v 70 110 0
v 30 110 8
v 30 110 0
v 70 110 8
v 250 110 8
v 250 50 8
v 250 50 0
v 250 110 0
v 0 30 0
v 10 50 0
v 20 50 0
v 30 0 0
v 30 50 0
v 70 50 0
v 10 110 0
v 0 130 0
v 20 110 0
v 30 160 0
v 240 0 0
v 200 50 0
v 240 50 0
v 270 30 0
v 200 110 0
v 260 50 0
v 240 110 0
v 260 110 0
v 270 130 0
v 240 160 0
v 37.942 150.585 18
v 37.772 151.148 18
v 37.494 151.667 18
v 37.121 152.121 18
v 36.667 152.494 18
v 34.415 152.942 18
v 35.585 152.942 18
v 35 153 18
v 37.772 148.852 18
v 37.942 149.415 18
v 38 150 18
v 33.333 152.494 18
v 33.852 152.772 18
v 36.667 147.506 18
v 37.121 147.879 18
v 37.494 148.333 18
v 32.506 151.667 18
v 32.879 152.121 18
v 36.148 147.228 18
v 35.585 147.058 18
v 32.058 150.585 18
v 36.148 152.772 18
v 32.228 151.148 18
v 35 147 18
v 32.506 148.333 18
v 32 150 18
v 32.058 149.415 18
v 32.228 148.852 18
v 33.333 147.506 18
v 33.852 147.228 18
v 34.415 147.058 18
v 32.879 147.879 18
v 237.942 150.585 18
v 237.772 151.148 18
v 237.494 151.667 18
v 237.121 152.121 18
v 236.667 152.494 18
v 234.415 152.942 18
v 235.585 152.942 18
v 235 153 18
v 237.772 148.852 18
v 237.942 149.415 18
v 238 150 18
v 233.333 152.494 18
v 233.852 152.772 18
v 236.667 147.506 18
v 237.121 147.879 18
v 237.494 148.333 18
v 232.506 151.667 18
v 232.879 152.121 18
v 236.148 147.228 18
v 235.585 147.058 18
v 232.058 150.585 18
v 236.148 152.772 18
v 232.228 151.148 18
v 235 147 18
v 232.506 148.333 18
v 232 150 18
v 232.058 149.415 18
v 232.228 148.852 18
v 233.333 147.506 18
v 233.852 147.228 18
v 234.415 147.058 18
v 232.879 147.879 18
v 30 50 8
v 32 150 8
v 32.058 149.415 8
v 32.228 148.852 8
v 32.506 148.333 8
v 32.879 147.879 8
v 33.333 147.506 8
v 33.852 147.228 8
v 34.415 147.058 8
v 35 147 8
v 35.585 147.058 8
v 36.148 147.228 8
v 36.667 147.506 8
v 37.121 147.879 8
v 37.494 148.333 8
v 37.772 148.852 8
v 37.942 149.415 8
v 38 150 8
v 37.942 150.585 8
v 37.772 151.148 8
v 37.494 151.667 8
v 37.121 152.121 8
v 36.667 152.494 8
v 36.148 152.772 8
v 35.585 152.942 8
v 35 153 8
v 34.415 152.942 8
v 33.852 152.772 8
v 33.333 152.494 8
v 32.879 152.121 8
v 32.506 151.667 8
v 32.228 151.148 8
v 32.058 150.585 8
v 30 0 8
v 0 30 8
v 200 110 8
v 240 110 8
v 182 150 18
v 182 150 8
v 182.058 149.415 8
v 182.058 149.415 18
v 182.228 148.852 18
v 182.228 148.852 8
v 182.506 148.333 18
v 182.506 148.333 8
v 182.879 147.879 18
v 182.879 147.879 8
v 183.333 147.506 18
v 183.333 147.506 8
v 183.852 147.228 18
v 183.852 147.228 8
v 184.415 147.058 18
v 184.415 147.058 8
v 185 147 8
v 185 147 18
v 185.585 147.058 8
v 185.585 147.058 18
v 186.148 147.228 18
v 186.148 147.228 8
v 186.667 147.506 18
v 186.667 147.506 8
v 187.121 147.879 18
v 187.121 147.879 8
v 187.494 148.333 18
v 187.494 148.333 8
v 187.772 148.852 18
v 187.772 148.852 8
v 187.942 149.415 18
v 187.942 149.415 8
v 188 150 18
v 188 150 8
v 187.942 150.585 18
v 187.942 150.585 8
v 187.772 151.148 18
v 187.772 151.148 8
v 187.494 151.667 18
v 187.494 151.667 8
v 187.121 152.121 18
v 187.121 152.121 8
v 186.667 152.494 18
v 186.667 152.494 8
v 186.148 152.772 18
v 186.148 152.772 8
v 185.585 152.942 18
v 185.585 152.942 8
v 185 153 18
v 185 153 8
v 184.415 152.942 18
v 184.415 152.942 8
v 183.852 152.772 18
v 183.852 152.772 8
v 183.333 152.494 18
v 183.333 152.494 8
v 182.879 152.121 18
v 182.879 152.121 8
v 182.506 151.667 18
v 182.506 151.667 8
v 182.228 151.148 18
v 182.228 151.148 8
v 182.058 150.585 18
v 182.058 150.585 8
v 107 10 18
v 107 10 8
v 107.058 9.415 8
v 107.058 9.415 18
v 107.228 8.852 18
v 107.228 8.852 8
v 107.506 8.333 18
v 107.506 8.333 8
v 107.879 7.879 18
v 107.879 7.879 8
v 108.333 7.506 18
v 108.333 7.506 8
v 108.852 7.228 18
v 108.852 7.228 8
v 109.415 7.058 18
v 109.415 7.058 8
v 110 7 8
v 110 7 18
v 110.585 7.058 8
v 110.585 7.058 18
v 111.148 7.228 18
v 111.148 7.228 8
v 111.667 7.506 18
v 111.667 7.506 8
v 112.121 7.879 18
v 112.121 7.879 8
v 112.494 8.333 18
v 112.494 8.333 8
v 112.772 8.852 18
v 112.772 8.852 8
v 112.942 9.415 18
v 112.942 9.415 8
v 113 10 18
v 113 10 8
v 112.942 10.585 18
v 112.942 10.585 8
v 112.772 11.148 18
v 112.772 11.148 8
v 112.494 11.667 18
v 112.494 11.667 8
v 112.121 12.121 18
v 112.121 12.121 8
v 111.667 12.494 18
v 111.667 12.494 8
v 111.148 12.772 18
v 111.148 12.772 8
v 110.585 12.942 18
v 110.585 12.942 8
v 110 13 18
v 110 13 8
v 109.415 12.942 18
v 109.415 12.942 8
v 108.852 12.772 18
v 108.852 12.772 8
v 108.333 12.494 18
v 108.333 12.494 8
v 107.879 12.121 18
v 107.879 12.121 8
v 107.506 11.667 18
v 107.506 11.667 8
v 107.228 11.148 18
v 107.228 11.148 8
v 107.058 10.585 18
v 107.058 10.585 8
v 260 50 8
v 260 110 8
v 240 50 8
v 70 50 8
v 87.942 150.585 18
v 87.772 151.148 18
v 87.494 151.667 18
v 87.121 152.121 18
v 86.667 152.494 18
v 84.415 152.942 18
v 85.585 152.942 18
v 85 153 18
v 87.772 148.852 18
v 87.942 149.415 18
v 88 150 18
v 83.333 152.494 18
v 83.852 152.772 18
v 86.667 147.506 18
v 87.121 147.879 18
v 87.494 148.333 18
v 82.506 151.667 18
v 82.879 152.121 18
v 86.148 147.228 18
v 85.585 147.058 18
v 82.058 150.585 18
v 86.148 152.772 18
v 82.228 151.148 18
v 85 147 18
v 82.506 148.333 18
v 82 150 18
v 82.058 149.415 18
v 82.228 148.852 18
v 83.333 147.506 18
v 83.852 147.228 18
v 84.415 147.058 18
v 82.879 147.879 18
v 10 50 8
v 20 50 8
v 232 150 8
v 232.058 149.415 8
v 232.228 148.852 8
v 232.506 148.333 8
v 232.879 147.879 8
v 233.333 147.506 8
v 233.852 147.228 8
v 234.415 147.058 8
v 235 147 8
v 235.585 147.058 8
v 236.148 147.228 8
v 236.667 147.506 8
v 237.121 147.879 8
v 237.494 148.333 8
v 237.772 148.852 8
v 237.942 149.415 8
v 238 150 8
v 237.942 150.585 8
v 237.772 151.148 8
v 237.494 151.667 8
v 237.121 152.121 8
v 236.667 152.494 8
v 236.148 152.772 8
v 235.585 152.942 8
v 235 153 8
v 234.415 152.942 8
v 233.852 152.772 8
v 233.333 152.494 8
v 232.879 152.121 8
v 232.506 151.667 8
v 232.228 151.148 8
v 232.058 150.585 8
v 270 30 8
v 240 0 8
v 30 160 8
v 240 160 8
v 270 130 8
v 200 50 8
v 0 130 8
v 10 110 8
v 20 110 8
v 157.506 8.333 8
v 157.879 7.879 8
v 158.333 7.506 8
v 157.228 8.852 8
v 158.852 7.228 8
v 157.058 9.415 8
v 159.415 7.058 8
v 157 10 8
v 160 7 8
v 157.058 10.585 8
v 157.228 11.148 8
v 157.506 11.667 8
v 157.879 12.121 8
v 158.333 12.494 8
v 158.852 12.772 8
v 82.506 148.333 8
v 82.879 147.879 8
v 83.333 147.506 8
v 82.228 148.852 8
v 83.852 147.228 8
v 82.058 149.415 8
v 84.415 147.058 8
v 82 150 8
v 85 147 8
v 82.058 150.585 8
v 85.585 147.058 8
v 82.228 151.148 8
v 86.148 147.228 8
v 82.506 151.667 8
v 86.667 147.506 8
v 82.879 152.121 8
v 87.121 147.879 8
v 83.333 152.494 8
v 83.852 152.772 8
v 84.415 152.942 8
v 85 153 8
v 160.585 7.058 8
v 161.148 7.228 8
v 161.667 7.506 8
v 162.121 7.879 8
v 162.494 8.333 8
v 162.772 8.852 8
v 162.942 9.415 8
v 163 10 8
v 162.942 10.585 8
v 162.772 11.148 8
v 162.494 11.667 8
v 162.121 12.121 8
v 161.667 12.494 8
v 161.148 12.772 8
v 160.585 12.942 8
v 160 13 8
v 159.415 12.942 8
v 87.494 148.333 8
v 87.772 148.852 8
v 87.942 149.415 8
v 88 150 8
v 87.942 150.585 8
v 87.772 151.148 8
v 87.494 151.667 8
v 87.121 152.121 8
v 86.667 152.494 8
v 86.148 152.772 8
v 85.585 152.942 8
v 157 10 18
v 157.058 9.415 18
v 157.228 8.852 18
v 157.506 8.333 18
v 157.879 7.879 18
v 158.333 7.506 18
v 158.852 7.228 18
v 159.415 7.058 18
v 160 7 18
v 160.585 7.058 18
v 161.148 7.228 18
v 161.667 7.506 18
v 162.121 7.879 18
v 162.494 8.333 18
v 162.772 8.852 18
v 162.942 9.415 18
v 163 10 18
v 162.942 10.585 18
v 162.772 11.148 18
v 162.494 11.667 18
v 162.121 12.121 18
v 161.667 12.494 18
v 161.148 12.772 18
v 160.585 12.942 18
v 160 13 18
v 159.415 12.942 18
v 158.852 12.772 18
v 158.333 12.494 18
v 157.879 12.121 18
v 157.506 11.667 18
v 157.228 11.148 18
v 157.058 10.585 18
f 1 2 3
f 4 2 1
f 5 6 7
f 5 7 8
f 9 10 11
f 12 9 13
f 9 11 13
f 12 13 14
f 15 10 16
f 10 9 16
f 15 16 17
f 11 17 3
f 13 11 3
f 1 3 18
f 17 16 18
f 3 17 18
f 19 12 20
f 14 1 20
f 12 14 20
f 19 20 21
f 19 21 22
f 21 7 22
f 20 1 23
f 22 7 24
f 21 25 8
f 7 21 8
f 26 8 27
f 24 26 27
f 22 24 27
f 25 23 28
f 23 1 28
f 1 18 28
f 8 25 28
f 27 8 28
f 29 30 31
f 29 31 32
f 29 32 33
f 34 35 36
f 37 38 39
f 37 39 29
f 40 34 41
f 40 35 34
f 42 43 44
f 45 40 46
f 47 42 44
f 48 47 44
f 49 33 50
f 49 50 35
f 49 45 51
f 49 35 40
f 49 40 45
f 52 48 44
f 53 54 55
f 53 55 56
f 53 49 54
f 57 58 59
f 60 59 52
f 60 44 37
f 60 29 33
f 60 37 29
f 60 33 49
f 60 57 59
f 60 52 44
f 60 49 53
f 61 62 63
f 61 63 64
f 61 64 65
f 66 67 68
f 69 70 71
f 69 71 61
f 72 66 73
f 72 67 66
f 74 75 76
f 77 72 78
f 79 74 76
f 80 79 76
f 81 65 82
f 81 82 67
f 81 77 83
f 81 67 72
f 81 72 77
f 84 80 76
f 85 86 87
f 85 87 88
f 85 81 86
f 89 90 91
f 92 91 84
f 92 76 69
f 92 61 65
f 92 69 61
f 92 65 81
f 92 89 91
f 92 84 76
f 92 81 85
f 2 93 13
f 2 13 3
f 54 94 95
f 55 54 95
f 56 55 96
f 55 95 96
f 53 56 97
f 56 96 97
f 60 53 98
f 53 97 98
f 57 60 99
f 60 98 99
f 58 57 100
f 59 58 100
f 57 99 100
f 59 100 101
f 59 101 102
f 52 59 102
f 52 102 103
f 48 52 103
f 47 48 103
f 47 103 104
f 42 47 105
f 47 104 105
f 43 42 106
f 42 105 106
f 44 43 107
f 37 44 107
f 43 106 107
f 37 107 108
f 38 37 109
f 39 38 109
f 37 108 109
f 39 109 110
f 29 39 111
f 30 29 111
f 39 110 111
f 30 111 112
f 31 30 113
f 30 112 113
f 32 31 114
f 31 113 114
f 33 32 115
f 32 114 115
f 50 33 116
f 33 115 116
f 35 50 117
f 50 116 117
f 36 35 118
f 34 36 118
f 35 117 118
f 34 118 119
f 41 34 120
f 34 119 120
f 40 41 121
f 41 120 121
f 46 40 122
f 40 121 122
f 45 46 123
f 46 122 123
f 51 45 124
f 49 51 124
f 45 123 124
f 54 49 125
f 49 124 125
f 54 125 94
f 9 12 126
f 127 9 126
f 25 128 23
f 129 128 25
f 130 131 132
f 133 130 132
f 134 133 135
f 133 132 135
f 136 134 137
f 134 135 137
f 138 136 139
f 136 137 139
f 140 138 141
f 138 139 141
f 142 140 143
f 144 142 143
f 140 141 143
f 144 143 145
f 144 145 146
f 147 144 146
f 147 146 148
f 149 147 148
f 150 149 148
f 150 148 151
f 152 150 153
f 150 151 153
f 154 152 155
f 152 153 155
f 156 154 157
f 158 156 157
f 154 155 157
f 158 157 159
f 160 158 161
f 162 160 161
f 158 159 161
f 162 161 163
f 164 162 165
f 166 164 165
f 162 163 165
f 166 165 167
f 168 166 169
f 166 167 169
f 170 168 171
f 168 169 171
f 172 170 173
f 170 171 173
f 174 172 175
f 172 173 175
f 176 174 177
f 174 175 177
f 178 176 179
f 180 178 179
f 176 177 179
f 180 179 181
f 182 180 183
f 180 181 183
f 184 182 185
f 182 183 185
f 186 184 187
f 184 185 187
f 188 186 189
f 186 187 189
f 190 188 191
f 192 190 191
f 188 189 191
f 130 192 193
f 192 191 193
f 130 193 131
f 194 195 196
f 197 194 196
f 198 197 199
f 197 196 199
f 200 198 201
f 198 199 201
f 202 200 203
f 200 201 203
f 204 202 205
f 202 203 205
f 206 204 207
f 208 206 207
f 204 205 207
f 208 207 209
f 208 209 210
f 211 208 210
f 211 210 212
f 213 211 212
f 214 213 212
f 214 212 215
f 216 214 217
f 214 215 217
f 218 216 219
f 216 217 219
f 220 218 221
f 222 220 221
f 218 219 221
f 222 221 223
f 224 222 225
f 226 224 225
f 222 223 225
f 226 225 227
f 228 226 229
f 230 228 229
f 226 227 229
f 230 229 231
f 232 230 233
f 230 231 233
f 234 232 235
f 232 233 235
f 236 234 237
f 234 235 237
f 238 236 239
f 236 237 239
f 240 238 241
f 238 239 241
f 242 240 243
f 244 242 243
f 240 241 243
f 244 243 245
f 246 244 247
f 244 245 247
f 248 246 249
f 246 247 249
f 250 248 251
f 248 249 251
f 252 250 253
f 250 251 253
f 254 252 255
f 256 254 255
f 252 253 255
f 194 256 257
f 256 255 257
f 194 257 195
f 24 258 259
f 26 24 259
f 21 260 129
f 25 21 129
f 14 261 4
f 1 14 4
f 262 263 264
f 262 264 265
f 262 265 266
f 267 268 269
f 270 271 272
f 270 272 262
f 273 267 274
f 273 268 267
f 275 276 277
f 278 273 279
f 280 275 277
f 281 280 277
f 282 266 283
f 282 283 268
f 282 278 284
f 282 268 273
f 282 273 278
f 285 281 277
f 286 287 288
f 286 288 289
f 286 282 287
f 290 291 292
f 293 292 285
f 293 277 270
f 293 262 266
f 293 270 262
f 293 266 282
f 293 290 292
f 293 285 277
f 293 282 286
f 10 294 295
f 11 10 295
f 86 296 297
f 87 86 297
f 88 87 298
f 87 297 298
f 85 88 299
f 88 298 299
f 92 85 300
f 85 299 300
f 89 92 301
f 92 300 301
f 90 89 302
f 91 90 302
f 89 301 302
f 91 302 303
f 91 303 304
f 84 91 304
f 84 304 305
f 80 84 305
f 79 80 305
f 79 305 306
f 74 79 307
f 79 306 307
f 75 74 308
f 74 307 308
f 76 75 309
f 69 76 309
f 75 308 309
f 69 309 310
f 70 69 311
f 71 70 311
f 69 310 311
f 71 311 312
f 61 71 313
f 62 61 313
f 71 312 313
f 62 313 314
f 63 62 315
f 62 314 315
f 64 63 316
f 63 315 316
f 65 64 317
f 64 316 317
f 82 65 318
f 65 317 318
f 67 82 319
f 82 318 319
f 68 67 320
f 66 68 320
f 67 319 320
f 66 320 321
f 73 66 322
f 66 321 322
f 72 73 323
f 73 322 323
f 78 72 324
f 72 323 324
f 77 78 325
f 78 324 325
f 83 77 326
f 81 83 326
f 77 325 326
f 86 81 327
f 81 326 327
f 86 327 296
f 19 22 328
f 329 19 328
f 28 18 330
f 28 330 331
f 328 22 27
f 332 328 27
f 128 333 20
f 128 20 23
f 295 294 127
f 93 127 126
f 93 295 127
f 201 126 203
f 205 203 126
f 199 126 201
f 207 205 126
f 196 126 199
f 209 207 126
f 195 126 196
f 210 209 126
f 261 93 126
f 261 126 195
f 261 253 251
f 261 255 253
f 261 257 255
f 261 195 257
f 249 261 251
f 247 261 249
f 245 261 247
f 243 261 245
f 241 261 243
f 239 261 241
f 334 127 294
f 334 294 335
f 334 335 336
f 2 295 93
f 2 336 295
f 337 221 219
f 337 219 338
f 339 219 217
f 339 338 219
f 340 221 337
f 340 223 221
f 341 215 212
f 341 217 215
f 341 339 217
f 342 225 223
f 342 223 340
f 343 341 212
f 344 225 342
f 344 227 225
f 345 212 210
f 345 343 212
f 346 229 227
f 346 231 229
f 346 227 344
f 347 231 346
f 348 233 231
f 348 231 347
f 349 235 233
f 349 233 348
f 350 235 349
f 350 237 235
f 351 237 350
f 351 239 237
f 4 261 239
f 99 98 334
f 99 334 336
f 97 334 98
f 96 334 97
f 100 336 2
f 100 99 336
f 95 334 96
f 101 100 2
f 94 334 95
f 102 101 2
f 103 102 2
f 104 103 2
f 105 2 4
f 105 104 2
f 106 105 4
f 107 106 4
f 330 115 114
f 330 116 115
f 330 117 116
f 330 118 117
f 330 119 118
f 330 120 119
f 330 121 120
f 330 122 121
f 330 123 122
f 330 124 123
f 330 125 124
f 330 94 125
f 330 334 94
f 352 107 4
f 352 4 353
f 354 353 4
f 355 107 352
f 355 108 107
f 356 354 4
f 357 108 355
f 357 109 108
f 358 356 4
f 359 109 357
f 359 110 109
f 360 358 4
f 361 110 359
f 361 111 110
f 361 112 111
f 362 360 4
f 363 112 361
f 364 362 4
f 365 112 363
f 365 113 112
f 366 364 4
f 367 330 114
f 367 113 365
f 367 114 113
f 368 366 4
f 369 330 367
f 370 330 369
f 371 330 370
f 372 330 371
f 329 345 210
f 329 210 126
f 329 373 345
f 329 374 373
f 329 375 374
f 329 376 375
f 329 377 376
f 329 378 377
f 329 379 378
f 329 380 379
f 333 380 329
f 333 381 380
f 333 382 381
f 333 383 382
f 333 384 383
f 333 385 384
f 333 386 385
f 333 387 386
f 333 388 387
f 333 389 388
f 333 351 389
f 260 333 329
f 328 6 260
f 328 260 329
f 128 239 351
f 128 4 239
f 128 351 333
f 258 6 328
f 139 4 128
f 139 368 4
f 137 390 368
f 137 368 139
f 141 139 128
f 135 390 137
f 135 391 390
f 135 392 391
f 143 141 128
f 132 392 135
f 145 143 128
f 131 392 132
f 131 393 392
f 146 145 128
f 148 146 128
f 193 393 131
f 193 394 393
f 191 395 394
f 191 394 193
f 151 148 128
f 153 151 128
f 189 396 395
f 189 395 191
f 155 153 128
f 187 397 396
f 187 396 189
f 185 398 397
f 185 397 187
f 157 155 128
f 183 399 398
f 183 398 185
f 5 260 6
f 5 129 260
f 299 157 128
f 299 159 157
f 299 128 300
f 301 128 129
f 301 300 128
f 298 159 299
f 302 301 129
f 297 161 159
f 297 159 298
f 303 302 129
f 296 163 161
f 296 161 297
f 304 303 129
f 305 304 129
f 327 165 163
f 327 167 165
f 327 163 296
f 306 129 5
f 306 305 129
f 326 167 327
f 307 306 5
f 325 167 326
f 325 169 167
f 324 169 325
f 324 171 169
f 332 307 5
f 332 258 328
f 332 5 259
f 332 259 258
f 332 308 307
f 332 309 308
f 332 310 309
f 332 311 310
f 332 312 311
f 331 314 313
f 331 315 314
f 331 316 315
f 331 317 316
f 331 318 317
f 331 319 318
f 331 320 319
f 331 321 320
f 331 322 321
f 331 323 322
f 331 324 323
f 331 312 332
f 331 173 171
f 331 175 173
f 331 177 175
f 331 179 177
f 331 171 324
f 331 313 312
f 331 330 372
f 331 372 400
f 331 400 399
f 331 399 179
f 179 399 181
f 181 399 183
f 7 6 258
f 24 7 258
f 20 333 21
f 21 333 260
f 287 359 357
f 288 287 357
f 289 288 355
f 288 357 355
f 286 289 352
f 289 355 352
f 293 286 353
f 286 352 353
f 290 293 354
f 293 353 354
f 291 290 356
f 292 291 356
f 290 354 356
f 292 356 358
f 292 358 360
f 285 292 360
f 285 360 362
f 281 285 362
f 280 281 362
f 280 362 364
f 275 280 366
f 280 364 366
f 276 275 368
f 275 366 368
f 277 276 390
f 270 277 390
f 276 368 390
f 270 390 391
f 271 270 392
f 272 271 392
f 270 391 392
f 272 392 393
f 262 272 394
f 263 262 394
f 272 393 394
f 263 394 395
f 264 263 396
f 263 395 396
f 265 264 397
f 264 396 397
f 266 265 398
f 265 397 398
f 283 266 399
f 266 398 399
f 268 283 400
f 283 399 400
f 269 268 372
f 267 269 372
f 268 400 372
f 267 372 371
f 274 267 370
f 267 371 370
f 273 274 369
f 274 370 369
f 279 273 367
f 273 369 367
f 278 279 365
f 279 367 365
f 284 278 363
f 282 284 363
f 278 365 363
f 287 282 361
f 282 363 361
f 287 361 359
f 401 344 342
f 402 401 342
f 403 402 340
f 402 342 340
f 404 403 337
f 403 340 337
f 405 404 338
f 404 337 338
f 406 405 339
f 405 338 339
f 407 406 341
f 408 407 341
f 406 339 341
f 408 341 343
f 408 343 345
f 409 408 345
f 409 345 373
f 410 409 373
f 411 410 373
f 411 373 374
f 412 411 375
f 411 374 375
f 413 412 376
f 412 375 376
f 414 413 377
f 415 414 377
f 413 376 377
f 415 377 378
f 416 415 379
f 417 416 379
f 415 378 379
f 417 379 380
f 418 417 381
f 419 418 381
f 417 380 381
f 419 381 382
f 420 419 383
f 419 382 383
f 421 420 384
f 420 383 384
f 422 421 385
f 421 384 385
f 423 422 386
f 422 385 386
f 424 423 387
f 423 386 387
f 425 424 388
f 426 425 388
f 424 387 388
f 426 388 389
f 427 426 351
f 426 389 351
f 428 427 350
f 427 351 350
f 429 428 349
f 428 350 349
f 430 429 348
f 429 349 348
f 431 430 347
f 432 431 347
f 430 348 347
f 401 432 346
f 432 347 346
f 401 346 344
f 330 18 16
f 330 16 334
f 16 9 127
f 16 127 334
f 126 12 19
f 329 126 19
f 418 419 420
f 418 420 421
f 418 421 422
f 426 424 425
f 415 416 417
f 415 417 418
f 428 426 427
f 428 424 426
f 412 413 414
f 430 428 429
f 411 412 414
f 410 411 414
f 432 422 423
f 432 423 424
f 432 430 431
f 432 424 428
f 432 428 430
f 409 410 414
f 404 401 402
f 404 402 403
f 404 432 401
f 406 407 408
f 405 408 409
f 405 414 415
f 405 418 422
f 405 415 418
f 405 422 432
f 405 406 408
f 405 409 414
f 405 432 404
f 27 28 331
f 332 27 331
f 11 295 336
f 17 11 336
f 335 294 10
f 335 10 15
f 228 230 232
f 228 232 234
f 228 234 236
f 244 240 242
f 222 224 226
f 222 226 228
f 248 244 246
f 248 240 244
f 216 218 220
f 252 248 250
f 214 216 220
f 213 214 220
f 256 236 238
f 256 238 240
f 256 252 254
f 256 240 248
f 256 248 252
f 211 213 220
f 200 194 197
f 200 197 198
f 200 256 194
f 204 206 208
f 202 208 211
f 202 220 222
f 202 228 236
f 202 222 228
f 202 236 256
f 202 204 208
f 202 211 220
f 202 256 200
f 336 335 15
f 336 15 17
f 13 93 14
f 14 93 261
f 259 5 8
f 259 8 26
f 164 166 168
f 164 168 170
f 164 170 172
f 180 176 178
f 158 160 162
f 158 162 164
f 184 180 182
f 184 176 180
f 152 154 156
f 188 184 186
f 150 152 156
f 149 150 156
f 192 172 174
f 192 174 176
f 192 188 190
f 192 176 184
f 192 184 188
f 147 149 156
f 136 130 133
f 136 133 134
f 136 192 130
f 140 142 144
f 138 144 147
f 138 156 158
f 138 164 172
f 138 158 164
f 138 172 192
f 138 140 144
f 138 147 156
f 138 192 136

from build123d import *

# Parameters (mm, degrees)
ESQUISSE1_W             = 270
ESQUISSE1_H             = 160
BOSS_EXTRU_1_DEPTH      = 8
CHANFREIN1_SIZE         = 30
ESQUISSE2_W             = 40
ESQUISSE2_H             = 60
ESQUISSE2_W_2           = 10
ENL_V_MAT_EXTRU_1_DEPTH = 8
ESQUISSE3_R             = 3
BOSS_EXTRU_2_DEPTH      = 10


with BuildPart() as part:
    # Esquisse1 → Boss.-Extru.1 (new body)
    with BuildSketch(Plane.XY):
        with Locations((135, 80)):
            Rectangle(ESQUISSE1_W, ESQUISSE1_H)
    extrude(amount=BOSS_EXTRU_1_DEPTH)

    # Chanfrein1
    chanfrein1_edges = [part.edges().sort_by_distance(p)[0] for p in [
        (0, 160, 4),
        (270, 160, 4),
        (270, 0, 4),
        (0, 0, 4),
    ]]
    chamfer(chanfrein1_edges, length=CHANFREIN1_SIZE)

    # Esquisse2 → Enlèv. mat.-Extru.1 (cut)
    with BuildSketch(Plane.XY.offset(8)):
        with Locations((50, 80)):
            Rectangle(ESQUISSE2_W, ESQUISSE2_H)
        with Locations((15, 80)):
            Rectangle(ESQUISSE2_W_2, ESQUISSE2_H)
        with Locations((220, 80)):
            Rectangle(ESQUISSE2_W, ESQUISSE2_H)
        with Locations((255, 80)):
            Rectangle(ESQUISSE2_W_2, ESQUISSE2_H)
    extrude(amount=-ENL_V_MAT_EXTRU_1_DEPTH, mode=Mode.SUBTRACT)

    # Esquisse3 → Boss.-Extru.2 (add)
    with BuildSketch(Plane.XY.offset(8)):
        with Locations(Location((35, 150, 0), (0, 0, 180))):
            Circle(ESQUISSE3_R)
        with Locations(Location((85, 150, 0), (0, 0, 180))):
            Circle(ESQUISSE3_R)
        with Locations(Location((185, 150, 0), (0, 0, 180))):
            Circle(ESQUISSE3_R)
        with Locations(Location((235, 150, 0), (0, 0, 180))):
            Circle(ESQUISSE3_R)
        with Locations(Location((110, 10, 0), (0, 0, 180))):
            Circle(ESQUISSE3_R)
        with Locations(Location((160, 10, 0), (0, 0, 180))):
            Circle(ESQUISSE3_R)
    extrude(amount=BOSS_EXTRU_2_DEPTH)


solid = part.part
